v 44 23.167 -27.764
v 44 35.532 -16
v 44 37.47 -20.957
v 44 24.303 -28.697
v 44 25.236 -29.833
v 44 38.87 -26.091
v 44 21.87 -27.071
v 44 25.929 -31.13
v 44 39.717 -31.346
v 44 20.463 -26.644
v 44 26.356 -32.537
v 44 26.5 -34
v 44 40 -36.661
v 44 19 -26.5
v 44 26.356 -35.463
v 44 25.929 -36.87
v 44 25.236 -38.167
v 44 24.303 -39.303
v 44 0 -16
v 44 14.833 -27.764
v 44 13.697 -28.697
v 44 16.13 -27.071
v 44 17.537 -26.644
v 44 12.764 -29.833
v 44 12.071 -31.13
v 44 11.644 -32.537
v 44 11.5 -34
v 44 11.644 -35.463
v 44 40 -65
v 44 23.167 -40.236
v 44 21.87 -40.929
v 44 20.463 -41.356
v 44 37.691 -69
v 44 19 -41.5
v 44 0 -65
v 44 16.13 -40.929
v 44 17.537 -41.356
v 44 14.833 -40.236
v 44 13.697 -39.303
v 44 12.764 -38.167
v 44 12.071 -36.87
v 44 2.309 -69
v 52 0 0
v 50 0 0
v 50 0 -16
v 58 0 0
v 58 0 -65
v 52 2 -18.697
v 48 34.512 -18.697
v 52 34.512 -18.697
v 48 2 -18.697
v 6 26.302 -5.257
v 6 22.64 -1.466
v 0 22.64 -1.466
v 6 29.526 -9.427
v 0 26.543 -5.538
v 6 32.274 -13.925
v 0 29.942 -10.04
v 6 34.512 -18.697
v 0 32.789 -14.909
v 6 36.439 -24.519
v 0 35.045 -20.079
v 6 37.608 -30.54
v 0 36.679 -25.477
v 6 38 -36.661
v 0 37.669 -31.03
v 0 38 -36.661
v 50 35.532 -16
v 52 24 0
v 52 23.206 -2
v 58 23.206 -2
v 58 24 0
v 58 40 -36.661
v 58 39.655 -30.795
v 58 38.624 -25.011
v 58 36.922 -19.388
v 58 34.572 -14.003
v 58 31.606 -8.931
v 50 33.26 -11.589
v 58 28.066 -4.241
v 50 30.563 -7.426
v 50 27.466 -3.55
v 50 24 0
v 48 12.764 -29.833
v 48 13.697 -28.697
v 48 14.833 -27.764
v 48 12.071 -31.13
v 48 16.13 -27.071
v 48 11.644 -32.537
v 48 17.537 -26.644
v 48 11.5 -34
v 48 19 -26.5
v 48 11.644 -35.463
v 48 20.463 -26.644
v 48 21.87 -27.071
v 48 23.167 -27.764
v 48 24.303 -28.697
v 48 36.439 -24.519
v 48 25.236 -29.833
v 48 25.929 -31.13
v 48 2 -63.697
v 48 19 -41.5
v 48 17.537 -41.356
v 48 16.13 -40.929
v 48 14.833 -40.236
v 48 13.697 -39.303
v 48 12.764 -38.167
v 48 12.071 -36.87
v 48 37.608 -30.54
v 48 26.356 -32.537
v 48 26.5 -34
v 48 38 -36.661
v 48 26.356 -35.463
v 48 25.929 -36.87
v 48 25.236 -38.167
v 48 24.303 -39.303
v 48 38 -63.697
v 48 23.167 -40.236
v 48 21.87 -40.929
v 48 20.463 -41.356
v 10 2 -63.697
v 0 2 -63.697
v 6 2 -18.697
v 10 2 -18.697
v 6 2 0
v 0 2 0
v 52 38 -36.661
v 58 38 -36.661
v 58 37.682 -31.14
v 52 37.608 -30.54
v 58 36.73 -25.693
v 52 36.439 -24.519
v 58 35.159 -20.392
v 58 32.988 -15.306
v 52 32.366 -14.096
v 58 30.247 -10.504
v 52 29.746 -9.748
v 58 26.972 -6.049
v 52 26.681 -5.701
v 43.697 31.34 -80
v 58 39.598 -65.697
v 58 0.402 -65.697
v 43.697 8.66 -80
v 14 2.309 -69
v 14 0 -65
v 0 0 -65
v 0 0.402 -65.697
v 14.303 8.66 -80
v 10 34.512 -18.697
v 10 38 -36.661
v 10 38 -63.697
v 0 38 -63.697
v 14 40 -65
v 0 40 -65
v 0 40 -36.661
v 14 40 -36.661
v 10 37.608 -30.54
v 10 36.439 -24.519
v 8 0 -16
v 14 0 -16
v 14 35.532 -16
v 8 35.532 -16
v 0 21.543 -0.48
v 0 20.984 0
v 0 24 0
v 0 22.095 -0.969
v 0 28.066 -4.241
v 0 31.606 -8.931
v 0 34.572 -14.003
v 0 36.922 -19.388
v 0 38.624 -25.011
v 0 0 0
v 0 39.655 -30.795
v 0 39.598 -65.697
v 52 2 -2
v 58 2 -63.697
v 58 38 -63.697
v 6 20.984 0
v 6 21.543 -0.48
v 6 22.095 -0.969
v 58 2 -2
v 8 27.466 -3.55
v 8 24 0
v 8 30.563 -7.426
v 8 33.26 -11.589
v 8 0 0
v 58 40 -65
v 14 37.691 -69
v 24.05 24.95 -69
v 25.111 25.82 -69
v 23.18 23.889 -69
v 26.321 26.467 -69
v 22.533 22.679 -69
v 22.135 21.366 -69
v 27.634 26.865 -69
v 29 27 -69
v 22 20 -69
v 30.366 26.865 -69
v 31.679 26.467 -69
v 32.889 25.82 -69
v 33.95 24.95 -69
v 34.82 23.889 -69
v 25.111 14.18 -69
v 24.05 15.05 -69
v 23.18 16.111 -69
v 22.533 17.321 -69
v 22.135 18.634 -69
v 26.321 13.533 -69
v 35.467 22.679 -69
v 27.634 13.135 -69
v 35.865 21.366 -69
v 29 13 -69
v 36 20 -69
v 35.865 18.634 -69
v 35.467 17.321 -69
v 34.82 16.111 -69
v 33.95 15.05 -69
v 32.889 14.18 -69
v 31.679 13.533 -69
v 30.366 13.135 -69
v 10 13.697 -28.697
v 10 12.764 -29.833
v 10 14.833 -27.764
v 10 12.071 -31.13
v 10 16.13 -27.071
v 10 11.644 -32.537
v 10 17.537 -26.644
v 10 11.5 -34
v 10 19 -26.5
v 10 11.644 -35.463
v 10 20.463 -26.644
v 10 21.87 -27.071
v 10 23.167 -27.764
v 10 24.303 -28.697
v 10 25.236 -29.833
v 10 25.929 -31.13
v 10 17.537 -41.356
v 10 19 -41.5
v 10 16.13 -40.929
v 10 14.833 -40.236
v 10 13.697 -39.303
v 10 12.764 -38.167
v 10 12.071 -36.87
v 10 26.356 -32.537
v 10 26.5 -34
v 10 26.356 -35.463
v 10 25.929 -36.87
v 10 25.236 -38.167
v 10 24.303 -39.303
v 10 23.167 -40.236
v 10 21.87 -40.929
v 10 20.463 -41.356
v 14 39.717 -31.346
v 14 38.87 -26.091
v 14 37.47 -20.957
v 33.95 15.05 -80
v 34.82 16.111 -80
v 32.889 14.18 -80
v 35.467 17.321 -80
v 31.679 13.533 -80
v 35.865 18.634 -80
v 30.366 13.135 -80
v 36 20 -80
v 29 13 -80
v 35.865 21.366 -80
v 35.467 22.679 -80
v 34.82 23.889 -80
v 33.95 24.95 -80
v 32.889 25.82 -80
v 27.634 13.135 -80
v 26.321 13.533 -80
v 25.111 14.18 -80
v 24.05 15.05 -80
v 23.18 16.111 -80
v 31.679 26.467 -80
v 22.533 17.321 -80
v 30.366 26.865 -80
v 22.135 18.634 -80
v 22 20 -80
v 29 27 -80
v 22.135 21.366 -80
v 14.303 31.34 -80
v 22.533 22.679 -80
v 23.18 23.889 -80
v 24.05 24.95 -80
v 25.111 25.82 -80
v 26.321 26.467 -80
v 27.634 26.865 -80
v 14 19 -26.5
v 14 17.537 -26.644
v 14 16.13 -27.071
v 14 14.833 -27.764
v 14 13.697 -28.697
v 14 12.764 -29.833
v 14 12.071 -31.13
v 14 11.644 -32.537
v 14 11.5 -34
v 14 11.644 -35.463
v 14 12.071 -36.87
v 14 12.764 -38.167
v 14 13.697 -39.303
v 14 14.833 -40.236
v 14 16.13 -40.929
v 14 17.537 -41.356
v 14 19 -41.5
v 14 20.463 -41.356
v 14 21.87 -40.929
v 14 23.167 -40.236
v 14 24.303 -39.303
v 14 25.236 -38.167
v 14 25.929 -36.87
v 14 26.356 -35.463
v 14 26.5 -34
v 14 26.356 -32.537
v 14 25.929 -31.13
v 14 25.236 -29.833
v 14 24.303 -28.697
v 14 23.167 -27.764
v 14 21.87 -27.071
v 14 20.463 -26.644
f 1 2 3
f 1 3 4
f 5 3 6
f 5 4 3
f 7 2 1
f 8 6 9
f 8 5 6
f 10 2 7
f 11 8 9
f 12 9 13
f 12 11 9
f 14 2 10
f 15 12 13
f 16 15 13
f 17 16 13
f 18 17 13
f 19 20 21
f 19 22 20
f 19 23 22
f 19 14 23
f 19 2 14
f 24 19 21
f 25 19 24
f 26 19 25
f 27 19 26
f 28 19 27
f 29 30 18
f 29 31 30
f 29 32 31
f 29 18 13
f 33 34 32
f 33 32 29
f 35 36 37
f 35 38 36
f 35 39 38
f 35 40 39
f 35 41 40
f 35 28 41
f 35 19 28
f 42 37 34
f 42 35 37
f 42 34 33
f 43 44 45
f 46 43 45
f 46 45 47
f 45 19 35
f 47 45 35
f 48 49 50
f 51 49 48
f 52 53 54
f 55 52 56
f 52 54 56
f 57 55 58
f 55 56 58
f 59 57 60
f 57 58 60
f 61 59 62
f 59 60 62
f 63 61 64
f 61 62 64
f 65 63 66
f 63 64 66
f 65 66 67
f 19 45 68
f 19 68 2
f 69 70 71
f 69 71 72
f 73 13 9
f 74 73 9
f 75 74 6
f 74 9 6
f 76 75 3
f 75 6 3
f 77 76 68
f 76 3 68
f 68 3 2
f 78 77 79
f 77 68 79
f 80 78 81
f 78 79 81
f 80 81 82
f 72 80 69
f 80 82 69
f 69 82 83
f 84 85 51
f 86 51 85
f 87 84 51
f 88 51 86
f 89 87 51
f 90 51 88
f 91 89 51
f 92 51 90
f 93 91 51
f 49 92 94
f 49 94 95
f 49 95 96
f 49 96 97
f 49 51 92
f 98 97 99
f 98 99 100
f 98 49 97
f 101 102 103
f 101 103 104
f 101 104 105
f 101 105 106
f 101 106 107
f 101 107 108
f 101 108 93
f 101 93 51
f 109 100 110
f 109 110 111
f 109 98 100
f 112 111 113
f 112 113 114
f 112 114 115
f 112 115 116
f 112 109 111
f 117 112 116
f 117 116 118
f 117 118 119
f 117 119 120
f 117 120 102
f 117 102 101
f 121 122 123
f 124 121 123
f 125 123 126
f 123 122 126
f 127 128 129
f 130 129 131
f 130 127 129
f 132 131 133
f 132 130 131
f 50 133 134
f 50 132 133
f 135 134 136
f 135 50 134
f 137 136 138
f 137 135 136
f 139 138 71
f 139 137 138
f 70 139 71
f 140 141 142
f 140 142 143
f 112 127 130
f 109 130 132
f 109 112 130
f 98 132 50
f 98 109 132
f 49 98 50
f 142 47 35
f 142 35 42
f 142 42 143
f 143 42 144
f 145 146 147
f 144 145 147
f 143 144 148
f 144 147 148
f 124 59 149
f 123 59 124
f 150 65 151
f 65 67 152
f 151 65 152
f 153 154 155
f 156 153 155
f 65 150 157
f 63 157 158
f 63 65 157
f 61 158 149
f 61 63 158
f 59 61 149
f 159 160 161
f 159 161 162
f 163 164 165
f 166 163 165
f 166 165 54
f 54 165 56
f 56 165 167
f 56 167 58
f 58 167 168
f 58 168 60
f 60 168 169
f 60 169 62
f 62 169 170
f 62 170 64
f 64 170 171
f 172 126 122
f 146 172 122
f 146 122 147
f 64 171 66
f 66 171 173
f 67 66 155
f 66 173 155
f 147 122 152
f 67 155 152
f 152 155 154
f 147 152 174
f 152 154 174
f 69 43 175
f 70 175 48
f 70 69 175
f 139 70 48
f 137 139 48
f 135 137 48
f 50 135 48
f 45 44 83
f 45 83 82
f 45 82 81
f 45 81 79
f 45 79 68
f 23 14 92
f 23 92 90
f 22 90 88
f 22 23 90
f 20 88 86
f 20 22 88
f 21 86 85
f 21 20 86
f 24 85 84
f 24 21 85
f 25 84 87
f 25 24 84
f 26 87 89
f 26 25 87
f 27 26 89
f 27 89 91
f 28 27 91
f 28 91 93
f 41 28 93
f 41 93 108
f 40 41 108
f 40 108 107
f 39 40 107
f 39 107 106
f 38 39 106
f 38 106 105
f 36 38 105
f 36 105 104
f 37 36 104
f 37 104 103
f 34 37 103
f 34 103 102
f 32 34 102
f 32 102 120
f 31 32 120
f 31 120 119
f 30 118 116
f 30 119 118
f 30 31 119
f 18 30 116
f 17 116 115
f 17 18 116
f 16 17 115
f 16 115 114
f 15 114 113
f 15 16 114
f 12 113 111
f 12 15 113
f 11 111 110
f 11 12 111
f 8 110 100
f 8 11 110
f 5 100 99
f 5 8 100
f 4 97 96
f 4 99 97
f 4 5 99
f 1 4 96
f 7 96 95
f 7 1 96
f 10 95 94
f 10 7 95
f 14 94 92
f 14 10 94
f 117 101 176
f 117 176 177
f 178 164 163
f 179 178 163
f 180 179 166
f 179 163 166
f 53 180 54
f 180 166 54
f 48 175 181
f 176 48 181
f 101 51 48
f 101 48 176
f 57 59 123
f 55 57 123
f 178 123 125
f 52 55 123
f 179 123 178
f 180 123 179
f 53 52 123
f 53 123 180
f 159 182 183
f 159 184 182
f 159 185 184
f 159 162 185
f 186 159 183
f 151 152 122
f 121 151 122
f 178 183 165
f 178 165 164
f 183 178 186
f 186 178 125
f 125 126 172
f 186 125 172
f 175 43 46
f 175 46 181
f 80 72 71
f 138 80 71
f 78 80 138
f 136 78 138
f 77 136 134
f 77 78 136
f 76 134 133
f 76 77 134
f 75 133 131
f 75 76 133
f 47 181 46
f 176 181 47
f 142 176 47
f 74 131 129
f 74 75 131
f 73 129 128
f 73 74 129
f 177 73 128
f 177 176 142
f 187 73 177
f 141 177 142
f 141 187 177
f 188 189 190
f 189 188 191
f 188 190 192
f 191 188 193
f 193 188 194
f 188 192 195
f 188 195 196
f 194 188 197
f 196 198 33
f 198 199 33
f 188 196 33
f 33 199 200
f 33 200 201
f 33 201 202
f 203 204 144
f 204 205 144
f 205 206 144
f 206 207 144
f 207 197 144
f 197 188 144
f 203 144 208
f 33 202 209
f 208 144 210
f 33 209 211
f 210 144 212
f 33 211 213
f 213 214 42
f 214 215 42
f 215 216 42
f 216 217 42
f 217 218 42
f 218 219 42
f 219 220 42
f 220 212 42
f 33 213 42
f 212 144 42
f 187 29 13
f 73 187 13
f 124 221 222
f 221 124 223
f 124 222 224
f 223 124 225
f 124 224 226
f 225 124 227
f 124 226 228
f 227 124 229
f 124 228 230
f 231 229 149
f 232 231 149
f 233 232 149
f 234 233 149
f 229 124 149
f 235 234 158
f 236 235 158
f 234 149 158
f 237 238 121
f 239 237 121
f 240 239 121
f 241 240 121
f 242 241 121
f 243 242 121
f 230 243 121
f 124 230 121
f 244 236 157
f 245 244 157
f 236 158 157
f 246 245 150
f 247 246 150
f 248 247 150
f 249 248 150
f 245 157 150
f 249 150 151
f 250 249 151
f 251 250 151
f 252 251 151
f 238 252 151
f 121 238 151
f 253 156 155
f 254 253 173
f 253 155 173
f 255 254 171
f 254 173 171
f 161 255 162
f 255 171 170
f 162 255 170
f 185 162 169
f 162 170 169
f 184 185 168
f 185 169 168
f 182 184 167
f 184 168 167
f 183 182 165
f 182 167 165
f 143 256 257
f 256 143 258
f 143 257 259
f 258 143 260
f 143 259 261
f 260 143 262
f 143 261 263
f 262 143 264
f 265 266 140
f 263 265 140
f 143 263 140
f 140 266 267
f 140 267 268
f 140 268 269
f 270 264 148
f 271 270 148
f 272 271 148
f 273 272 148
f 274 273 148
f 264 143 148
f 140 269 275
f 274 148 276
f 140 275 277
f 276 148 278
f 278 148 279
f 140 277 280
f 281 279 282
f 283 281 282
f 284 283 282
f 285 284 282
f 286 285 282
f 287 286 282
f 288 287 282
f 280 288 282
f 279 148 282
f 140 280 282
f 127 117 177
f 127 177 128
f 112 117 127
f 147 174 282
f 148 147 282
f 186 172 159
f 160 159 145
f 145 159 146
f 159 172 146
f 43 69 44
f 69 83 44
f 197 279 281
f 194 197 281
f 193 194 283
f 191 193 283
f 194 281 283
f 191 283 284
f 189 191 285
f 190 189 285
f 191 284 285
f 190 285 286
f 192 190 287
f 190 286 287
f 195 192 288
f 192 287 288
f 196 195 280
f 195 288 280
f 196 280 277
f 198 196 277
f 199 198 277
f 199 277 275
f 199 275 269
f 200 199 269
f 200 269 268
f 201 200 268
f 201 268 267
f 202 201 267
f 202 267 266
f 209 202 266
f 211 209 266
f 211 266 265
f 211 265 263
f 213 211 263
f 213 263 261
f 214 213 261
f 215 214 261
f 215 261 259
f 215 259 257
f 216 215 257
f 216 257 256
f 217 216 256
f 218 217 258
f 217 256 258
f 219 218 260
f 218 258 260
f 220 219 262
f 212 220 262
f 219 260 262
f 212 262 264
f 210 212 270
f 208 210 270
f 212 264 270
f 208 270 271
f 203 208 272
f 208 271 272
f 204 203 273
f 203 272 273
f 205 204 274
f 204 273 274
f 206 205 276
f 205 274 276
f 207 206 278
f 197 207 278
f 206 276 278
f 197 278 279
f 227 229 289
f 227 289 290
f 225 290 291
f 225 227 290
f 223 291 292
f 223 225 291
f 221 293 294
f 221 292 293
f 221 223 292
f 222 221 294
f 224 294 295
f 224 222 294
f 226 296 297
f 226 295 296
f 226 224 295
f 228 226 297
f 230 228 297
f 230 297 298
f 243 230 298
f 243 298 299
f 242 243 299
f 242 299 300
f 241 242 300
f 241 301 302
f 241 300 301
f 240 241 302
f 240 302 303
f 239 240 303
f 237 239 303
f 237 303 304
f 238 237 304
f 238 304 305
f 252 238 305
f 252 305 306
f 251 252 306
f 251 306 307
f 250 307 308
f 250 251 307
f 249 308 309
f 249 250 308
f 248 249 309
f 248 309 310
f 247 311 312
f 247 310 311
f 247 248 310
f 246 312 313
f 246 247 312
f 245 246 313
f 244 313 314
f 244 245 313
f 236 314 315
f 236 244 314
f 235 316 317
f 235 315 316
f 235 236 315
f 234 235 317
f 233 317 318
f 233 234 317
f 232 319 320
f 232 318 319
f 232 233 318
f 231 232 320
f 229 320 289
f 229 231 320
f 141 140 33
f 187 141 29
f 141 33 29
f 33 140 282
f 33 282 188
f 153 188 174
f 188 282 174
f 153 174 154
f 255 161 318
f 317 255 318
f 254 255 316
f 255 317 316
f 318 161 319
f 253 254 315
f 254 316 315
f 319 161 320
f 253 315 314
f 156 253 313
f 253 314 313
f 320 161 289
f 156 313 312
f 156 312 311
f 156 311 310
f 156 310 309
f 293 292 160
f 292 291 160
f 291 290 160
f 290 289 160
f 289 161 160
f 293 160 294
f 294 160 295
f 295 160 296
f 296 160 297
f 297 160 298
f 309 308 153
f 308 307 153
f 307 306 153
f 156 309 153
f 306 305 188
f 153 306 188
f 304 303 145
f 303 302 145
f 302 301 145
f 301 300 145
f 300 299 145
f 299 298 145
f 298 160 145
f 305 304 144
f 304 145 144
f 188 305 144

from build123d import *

# Parameters (mm, degrees)
SKETCH1_R                           = 7.5
BOSS_EXTRUDE1_DEPTH                 = 58
CUT_EXTRUDE1_DEPTH                  = 107.60206377
CUT_EXTRUDE1_DEPTH_BACK             = 10
SKETCH3_W                           = 30
SKETCH3_H                           = 53
CUT_EXTRUDE3_DEPTH                  = 107.60206377
CUT_EXTRUDE3_DIRECTION_2_REACH      = 108.602
CUT_EXTRUDE3_DIRECTION_2_END_RADIUS = 50
CUT_EXTRUDE4_DEPTH                  = 107.60206377
SKETCH8_R                           = 7
CUT_EXTRUDE5_DEPTH                  = 107.60206377
SKETCH10_R                          = 7.5
CUT_EXTRUDE6_DEPTH                  = 6
CUT_EXTRUDE7_DEPTH                  = 4
CUT_EXTRUDE9_START                  = -6
SKETCH12_R                          = 7.5
CUT_EXTRUDE9_DEPTH                  = 6
CUT_EXTRUDE10_START                 = -4
CUT_EXTRUDE10_DEPTH                 = 4


with BuildPart() as part:
    # Sketch1 → Boss-Extrude1 (new body)
    with BuildSketch(Plane(origin=(0, 0, 0), x_dir=(0, 0, -1), z_dir=(1, 0, 0))):
        with BuildLine():
            Line((0, 0), (65, 0))
            Line((65, 0), (80, 8.660254038))
            Line((80, 8.660254038), (80, 31.339745962))
            Line((80, 31.339745962), (65, 40))
            Line((65, 40), (36.66060556, 40))
            ThreePointArc((36.66060556, 40), (16.66060556, 35.82575695), (0, 24))
            Line((0, 24), (0, 0))
        make_face()
        with Locations(Location((34, 19, 0), (0, 0, 180))):
            Circle(SKETCH1_R, mode=Mode.SUBTRACT)
    extrude(amount=BOSS_EXTRUDE1_DEPTH)

    # Sketch3 → Cut-Extrude1 (cut, two sides: drawn at the far end of the back side and taken through both)
    with BuildSketch(Plane(origin=(0, 0, 0), x_dir=(1, 0, 0), z_dir=(0, 1, 0)).offset(-CUT_EXTRUDE1_DEPTH_BACK)):
        with Locations((29, 42.5)):
            Rectangle(SKETCH3_W, SKETCH3_H)
    extrude(amount=CUT_EXTRUDE1_DEPTH + CUT_EXTRUDE1_DEPTH_BACK, mode=Mode.SUBTRACT)

    # Sketch5 → Cut-Extrude3 (cut)
    with BuildSketch(Plane(origin=(0, 0, 0), x_dir=(1, 0, 0), z_dir=(0, 1, 0))):
        Polygon((29, 0), (29, 16), (14, 16), (8, 16), (8, 0), align=None)
        Polygon((44, 16), (29, 16), (29, 0), (50, 0), (50, 16), align=None)
    extrude(amount=-CUT_EXTRUDE3_DEPTH, mode=Mode.SUBTRACT)

    # Cut-Extrude3 direction 2: up to this cylinder (the profile starts inside it)
    cut_extrude3_direction_2_end = Plane(origin=(29, -10, -36.66060556), z_dir=(-1, 0, 0)) * Cylinder(CUT_EXTRUDE3_DIRECTION_2_END_RADIUS, 339.204, mode=Mode.PRIVATE)
    # Sketch5 → Cut-Extrude3 direction 2 (cut, up to the surface)
    with BuildSketch(Plane(origin=(0, 0, 0), x_dir=(1, 0, 0), z_dir=(0, 1, 0)), mode=Mode.PRIVATE) as cut_extrude3_direction_2_sk1:
        Polygon((29, 0), (29, 16), (14, 16), (8, 16), (8, 0), align=None)
    cut_extrude3_direction_2_tool1 = extrude(cut_extrude3_direction_2_sk1.sketch, amount=CUT_EXTRUDE3_DIRECTION_2_REACH, mode=Mode.PRIVATE) & cut_extrude3_direction_2_end
    add(cut_extrude3_direction_2_tool1.solids().sort_by_distance((18.5, 0, -8))[0], mode=Mode.SUBTRACT)
    # Sketch5 → Cut-Extrude3 direction 2 (cut, up to the surface)
    with BuildSketch(Plane(origin=(0, 0, 0), x_dir=(1, 0, 0), z_dir=(0, 1, 0)), mode=Mode.PRIVATE) as cut_extrude3_direction_2_sk2:
        Polygon((44, 16), (29, 16), (29, 0), (50, 0), (50, 16), align=None)
    cut_extrude3_direction_2_tool2 = extrude(cut_extrude3_direction_2_sk2.sketch, amount=CUT_EXTRUDE3_DIRECTION_2_REACH, mode=Mode.PRIVATE) & cut_extrude3_direction_2_end
    add(cut_extrude3_direction_2_tool2.solids().sort_by_distance((39.5, 0, -8))[0], mode=Mode.SUBTRACT)

    # Sketch7 → Cut-Extrude4 (cut, through all)
    with BuildSketch(Plane(origin=(0, 0, 0), x_dir=(1, 0, 0), z_dir=(0, 1, 0))):
        Polygon((0, 65.69666313), (14.30333687, 80), (0, 80), align=None)
        Polygon((58, 65.69666313), (43.69666313, 80), (58, 80), align=None)
    extrude(amount=CUT_EXTRUDE4_DEPTH, mode=Mode.SUBTRACT)

    # Sketch8 → Cut-Extrude5 (cut, through all)
    with BuildSketch(Plane(origin=(0, 0, -80), x_dir=(-1, 0, 0), z_dir=(0, 0, -1))):
        with Locations((-29, 20)):
            Circle(SKETCH8_R)
    extrude(amount=-CUT_EXTRUDE5_DEPTH, mode=Mode.SUBTRACT)

    # Sketch10 → Cut-Extrude6 (cut)
    with BuildSketch(Plane.ZY):
        with BuildLine():
            Line((-36.66060556, 38), (-63.69666313, 38))
            Line((-63.69666313, 38), (-63.69666313, 2))
            Line((-63.69666313, 2), (0, 2))
            Line((0, 2), (0, 20.98386677))
            ThreePointArc((0, 20.98386677), (-0.7236706, 21.820381922), (-1.466424222, 22.64))
            ThreePointArc((-1.466424222, 22.64), (-17.46060556, 33.992726672), (-36.66060556, 38))
        make_face()
        with Locations((-34, 19)):
            Circle(SKETCH10_R, mode=Mode.SUBTRACT)
    extrude(amount=-CUT_EXTRUDE6_DEPTH, mode=Mode.SUBTRACT)

    # Sketch11 → Cut-Extrude7 (cut)
    with BuildSketch(Plane.ZY.offset(-6)):
        with BuildLine():
            Line((-63.69666313, 2), (-63.69666313, 38))
            Line((-63.69666313, 38), (-36.66060556, 38))
            ThreePointArc((-36.66060556, 38), (-27.510864492, 37.119870951), (-18.69666313, 34.511759933))
            Line((-18.69666313, 34.511759933), (-18.69666313, 2))
            Line((-18.69666313, 2), (-63.69666313, 2))
        make_face()
    extrude(amount=-CUT_EXTRUDE7_DEPTH, mode=Mode.SUBTRACT)

    # Sketch12 → Cut-Extrude9 (cut)
    with BuildSketch(Plane(origin=(58, 0, 0), x_dir=(0, 0, -1), z_dir=(1, 0, 0)).offset(CUT_EXTRUDE9_START)):
        with BuildLine():
            Line((63.69666313, 38), (36.66060556, 38))
            ThreePointArc((36.66060556, 38), (17.817714076, 34.146862182), (2, 23.206060023))
            Line((2, 23.206060023), (0, 24))
            Line((0, 24), (0, 0))
            Line((0, 0), (2, 2))
            Line((2, 2), (63.69666313, 2))
            Line((63.69666313, 2), (63.69666313, 38))
        make_face()
        with Locations(Location((34, 19, 0), (0, 0, 180))):
            Circle(SKETCH12_R, mode=Mode.SUBTRACT)
    extrude(amount=CUT_EXTRUDE9_DEPTH, mode=Mode.SUBTRACT)

    # Sketch13 → Cut-Extrude10 (cut)
    with BuildSketch(Plane(origin=(52, 0, 0), x_dir=(0, 0, -1), z_dir=(1, 0, 0)).offset(CUT_EXTRUDE10_START)):
        with BuildLine():
            Line((18.69666313, 34.511759933), (18.69666313, 2))
            Line((18.69666313, 2), (63.69666313, 2))
            Line((63.69666313, 2), (63.69666313, 38))
            Line((63.69666313, 38), (36.66060556, 38))
            ThreePointArc((36.66060556, 38), (27.510864492, 37.119870951), (18.69666313, 34.511759933))
        make_face()
    extrude(amount=CUT_EXTRUDE10_DEPTH, mode=Mode.SUBTRACT)


solid = part.part
